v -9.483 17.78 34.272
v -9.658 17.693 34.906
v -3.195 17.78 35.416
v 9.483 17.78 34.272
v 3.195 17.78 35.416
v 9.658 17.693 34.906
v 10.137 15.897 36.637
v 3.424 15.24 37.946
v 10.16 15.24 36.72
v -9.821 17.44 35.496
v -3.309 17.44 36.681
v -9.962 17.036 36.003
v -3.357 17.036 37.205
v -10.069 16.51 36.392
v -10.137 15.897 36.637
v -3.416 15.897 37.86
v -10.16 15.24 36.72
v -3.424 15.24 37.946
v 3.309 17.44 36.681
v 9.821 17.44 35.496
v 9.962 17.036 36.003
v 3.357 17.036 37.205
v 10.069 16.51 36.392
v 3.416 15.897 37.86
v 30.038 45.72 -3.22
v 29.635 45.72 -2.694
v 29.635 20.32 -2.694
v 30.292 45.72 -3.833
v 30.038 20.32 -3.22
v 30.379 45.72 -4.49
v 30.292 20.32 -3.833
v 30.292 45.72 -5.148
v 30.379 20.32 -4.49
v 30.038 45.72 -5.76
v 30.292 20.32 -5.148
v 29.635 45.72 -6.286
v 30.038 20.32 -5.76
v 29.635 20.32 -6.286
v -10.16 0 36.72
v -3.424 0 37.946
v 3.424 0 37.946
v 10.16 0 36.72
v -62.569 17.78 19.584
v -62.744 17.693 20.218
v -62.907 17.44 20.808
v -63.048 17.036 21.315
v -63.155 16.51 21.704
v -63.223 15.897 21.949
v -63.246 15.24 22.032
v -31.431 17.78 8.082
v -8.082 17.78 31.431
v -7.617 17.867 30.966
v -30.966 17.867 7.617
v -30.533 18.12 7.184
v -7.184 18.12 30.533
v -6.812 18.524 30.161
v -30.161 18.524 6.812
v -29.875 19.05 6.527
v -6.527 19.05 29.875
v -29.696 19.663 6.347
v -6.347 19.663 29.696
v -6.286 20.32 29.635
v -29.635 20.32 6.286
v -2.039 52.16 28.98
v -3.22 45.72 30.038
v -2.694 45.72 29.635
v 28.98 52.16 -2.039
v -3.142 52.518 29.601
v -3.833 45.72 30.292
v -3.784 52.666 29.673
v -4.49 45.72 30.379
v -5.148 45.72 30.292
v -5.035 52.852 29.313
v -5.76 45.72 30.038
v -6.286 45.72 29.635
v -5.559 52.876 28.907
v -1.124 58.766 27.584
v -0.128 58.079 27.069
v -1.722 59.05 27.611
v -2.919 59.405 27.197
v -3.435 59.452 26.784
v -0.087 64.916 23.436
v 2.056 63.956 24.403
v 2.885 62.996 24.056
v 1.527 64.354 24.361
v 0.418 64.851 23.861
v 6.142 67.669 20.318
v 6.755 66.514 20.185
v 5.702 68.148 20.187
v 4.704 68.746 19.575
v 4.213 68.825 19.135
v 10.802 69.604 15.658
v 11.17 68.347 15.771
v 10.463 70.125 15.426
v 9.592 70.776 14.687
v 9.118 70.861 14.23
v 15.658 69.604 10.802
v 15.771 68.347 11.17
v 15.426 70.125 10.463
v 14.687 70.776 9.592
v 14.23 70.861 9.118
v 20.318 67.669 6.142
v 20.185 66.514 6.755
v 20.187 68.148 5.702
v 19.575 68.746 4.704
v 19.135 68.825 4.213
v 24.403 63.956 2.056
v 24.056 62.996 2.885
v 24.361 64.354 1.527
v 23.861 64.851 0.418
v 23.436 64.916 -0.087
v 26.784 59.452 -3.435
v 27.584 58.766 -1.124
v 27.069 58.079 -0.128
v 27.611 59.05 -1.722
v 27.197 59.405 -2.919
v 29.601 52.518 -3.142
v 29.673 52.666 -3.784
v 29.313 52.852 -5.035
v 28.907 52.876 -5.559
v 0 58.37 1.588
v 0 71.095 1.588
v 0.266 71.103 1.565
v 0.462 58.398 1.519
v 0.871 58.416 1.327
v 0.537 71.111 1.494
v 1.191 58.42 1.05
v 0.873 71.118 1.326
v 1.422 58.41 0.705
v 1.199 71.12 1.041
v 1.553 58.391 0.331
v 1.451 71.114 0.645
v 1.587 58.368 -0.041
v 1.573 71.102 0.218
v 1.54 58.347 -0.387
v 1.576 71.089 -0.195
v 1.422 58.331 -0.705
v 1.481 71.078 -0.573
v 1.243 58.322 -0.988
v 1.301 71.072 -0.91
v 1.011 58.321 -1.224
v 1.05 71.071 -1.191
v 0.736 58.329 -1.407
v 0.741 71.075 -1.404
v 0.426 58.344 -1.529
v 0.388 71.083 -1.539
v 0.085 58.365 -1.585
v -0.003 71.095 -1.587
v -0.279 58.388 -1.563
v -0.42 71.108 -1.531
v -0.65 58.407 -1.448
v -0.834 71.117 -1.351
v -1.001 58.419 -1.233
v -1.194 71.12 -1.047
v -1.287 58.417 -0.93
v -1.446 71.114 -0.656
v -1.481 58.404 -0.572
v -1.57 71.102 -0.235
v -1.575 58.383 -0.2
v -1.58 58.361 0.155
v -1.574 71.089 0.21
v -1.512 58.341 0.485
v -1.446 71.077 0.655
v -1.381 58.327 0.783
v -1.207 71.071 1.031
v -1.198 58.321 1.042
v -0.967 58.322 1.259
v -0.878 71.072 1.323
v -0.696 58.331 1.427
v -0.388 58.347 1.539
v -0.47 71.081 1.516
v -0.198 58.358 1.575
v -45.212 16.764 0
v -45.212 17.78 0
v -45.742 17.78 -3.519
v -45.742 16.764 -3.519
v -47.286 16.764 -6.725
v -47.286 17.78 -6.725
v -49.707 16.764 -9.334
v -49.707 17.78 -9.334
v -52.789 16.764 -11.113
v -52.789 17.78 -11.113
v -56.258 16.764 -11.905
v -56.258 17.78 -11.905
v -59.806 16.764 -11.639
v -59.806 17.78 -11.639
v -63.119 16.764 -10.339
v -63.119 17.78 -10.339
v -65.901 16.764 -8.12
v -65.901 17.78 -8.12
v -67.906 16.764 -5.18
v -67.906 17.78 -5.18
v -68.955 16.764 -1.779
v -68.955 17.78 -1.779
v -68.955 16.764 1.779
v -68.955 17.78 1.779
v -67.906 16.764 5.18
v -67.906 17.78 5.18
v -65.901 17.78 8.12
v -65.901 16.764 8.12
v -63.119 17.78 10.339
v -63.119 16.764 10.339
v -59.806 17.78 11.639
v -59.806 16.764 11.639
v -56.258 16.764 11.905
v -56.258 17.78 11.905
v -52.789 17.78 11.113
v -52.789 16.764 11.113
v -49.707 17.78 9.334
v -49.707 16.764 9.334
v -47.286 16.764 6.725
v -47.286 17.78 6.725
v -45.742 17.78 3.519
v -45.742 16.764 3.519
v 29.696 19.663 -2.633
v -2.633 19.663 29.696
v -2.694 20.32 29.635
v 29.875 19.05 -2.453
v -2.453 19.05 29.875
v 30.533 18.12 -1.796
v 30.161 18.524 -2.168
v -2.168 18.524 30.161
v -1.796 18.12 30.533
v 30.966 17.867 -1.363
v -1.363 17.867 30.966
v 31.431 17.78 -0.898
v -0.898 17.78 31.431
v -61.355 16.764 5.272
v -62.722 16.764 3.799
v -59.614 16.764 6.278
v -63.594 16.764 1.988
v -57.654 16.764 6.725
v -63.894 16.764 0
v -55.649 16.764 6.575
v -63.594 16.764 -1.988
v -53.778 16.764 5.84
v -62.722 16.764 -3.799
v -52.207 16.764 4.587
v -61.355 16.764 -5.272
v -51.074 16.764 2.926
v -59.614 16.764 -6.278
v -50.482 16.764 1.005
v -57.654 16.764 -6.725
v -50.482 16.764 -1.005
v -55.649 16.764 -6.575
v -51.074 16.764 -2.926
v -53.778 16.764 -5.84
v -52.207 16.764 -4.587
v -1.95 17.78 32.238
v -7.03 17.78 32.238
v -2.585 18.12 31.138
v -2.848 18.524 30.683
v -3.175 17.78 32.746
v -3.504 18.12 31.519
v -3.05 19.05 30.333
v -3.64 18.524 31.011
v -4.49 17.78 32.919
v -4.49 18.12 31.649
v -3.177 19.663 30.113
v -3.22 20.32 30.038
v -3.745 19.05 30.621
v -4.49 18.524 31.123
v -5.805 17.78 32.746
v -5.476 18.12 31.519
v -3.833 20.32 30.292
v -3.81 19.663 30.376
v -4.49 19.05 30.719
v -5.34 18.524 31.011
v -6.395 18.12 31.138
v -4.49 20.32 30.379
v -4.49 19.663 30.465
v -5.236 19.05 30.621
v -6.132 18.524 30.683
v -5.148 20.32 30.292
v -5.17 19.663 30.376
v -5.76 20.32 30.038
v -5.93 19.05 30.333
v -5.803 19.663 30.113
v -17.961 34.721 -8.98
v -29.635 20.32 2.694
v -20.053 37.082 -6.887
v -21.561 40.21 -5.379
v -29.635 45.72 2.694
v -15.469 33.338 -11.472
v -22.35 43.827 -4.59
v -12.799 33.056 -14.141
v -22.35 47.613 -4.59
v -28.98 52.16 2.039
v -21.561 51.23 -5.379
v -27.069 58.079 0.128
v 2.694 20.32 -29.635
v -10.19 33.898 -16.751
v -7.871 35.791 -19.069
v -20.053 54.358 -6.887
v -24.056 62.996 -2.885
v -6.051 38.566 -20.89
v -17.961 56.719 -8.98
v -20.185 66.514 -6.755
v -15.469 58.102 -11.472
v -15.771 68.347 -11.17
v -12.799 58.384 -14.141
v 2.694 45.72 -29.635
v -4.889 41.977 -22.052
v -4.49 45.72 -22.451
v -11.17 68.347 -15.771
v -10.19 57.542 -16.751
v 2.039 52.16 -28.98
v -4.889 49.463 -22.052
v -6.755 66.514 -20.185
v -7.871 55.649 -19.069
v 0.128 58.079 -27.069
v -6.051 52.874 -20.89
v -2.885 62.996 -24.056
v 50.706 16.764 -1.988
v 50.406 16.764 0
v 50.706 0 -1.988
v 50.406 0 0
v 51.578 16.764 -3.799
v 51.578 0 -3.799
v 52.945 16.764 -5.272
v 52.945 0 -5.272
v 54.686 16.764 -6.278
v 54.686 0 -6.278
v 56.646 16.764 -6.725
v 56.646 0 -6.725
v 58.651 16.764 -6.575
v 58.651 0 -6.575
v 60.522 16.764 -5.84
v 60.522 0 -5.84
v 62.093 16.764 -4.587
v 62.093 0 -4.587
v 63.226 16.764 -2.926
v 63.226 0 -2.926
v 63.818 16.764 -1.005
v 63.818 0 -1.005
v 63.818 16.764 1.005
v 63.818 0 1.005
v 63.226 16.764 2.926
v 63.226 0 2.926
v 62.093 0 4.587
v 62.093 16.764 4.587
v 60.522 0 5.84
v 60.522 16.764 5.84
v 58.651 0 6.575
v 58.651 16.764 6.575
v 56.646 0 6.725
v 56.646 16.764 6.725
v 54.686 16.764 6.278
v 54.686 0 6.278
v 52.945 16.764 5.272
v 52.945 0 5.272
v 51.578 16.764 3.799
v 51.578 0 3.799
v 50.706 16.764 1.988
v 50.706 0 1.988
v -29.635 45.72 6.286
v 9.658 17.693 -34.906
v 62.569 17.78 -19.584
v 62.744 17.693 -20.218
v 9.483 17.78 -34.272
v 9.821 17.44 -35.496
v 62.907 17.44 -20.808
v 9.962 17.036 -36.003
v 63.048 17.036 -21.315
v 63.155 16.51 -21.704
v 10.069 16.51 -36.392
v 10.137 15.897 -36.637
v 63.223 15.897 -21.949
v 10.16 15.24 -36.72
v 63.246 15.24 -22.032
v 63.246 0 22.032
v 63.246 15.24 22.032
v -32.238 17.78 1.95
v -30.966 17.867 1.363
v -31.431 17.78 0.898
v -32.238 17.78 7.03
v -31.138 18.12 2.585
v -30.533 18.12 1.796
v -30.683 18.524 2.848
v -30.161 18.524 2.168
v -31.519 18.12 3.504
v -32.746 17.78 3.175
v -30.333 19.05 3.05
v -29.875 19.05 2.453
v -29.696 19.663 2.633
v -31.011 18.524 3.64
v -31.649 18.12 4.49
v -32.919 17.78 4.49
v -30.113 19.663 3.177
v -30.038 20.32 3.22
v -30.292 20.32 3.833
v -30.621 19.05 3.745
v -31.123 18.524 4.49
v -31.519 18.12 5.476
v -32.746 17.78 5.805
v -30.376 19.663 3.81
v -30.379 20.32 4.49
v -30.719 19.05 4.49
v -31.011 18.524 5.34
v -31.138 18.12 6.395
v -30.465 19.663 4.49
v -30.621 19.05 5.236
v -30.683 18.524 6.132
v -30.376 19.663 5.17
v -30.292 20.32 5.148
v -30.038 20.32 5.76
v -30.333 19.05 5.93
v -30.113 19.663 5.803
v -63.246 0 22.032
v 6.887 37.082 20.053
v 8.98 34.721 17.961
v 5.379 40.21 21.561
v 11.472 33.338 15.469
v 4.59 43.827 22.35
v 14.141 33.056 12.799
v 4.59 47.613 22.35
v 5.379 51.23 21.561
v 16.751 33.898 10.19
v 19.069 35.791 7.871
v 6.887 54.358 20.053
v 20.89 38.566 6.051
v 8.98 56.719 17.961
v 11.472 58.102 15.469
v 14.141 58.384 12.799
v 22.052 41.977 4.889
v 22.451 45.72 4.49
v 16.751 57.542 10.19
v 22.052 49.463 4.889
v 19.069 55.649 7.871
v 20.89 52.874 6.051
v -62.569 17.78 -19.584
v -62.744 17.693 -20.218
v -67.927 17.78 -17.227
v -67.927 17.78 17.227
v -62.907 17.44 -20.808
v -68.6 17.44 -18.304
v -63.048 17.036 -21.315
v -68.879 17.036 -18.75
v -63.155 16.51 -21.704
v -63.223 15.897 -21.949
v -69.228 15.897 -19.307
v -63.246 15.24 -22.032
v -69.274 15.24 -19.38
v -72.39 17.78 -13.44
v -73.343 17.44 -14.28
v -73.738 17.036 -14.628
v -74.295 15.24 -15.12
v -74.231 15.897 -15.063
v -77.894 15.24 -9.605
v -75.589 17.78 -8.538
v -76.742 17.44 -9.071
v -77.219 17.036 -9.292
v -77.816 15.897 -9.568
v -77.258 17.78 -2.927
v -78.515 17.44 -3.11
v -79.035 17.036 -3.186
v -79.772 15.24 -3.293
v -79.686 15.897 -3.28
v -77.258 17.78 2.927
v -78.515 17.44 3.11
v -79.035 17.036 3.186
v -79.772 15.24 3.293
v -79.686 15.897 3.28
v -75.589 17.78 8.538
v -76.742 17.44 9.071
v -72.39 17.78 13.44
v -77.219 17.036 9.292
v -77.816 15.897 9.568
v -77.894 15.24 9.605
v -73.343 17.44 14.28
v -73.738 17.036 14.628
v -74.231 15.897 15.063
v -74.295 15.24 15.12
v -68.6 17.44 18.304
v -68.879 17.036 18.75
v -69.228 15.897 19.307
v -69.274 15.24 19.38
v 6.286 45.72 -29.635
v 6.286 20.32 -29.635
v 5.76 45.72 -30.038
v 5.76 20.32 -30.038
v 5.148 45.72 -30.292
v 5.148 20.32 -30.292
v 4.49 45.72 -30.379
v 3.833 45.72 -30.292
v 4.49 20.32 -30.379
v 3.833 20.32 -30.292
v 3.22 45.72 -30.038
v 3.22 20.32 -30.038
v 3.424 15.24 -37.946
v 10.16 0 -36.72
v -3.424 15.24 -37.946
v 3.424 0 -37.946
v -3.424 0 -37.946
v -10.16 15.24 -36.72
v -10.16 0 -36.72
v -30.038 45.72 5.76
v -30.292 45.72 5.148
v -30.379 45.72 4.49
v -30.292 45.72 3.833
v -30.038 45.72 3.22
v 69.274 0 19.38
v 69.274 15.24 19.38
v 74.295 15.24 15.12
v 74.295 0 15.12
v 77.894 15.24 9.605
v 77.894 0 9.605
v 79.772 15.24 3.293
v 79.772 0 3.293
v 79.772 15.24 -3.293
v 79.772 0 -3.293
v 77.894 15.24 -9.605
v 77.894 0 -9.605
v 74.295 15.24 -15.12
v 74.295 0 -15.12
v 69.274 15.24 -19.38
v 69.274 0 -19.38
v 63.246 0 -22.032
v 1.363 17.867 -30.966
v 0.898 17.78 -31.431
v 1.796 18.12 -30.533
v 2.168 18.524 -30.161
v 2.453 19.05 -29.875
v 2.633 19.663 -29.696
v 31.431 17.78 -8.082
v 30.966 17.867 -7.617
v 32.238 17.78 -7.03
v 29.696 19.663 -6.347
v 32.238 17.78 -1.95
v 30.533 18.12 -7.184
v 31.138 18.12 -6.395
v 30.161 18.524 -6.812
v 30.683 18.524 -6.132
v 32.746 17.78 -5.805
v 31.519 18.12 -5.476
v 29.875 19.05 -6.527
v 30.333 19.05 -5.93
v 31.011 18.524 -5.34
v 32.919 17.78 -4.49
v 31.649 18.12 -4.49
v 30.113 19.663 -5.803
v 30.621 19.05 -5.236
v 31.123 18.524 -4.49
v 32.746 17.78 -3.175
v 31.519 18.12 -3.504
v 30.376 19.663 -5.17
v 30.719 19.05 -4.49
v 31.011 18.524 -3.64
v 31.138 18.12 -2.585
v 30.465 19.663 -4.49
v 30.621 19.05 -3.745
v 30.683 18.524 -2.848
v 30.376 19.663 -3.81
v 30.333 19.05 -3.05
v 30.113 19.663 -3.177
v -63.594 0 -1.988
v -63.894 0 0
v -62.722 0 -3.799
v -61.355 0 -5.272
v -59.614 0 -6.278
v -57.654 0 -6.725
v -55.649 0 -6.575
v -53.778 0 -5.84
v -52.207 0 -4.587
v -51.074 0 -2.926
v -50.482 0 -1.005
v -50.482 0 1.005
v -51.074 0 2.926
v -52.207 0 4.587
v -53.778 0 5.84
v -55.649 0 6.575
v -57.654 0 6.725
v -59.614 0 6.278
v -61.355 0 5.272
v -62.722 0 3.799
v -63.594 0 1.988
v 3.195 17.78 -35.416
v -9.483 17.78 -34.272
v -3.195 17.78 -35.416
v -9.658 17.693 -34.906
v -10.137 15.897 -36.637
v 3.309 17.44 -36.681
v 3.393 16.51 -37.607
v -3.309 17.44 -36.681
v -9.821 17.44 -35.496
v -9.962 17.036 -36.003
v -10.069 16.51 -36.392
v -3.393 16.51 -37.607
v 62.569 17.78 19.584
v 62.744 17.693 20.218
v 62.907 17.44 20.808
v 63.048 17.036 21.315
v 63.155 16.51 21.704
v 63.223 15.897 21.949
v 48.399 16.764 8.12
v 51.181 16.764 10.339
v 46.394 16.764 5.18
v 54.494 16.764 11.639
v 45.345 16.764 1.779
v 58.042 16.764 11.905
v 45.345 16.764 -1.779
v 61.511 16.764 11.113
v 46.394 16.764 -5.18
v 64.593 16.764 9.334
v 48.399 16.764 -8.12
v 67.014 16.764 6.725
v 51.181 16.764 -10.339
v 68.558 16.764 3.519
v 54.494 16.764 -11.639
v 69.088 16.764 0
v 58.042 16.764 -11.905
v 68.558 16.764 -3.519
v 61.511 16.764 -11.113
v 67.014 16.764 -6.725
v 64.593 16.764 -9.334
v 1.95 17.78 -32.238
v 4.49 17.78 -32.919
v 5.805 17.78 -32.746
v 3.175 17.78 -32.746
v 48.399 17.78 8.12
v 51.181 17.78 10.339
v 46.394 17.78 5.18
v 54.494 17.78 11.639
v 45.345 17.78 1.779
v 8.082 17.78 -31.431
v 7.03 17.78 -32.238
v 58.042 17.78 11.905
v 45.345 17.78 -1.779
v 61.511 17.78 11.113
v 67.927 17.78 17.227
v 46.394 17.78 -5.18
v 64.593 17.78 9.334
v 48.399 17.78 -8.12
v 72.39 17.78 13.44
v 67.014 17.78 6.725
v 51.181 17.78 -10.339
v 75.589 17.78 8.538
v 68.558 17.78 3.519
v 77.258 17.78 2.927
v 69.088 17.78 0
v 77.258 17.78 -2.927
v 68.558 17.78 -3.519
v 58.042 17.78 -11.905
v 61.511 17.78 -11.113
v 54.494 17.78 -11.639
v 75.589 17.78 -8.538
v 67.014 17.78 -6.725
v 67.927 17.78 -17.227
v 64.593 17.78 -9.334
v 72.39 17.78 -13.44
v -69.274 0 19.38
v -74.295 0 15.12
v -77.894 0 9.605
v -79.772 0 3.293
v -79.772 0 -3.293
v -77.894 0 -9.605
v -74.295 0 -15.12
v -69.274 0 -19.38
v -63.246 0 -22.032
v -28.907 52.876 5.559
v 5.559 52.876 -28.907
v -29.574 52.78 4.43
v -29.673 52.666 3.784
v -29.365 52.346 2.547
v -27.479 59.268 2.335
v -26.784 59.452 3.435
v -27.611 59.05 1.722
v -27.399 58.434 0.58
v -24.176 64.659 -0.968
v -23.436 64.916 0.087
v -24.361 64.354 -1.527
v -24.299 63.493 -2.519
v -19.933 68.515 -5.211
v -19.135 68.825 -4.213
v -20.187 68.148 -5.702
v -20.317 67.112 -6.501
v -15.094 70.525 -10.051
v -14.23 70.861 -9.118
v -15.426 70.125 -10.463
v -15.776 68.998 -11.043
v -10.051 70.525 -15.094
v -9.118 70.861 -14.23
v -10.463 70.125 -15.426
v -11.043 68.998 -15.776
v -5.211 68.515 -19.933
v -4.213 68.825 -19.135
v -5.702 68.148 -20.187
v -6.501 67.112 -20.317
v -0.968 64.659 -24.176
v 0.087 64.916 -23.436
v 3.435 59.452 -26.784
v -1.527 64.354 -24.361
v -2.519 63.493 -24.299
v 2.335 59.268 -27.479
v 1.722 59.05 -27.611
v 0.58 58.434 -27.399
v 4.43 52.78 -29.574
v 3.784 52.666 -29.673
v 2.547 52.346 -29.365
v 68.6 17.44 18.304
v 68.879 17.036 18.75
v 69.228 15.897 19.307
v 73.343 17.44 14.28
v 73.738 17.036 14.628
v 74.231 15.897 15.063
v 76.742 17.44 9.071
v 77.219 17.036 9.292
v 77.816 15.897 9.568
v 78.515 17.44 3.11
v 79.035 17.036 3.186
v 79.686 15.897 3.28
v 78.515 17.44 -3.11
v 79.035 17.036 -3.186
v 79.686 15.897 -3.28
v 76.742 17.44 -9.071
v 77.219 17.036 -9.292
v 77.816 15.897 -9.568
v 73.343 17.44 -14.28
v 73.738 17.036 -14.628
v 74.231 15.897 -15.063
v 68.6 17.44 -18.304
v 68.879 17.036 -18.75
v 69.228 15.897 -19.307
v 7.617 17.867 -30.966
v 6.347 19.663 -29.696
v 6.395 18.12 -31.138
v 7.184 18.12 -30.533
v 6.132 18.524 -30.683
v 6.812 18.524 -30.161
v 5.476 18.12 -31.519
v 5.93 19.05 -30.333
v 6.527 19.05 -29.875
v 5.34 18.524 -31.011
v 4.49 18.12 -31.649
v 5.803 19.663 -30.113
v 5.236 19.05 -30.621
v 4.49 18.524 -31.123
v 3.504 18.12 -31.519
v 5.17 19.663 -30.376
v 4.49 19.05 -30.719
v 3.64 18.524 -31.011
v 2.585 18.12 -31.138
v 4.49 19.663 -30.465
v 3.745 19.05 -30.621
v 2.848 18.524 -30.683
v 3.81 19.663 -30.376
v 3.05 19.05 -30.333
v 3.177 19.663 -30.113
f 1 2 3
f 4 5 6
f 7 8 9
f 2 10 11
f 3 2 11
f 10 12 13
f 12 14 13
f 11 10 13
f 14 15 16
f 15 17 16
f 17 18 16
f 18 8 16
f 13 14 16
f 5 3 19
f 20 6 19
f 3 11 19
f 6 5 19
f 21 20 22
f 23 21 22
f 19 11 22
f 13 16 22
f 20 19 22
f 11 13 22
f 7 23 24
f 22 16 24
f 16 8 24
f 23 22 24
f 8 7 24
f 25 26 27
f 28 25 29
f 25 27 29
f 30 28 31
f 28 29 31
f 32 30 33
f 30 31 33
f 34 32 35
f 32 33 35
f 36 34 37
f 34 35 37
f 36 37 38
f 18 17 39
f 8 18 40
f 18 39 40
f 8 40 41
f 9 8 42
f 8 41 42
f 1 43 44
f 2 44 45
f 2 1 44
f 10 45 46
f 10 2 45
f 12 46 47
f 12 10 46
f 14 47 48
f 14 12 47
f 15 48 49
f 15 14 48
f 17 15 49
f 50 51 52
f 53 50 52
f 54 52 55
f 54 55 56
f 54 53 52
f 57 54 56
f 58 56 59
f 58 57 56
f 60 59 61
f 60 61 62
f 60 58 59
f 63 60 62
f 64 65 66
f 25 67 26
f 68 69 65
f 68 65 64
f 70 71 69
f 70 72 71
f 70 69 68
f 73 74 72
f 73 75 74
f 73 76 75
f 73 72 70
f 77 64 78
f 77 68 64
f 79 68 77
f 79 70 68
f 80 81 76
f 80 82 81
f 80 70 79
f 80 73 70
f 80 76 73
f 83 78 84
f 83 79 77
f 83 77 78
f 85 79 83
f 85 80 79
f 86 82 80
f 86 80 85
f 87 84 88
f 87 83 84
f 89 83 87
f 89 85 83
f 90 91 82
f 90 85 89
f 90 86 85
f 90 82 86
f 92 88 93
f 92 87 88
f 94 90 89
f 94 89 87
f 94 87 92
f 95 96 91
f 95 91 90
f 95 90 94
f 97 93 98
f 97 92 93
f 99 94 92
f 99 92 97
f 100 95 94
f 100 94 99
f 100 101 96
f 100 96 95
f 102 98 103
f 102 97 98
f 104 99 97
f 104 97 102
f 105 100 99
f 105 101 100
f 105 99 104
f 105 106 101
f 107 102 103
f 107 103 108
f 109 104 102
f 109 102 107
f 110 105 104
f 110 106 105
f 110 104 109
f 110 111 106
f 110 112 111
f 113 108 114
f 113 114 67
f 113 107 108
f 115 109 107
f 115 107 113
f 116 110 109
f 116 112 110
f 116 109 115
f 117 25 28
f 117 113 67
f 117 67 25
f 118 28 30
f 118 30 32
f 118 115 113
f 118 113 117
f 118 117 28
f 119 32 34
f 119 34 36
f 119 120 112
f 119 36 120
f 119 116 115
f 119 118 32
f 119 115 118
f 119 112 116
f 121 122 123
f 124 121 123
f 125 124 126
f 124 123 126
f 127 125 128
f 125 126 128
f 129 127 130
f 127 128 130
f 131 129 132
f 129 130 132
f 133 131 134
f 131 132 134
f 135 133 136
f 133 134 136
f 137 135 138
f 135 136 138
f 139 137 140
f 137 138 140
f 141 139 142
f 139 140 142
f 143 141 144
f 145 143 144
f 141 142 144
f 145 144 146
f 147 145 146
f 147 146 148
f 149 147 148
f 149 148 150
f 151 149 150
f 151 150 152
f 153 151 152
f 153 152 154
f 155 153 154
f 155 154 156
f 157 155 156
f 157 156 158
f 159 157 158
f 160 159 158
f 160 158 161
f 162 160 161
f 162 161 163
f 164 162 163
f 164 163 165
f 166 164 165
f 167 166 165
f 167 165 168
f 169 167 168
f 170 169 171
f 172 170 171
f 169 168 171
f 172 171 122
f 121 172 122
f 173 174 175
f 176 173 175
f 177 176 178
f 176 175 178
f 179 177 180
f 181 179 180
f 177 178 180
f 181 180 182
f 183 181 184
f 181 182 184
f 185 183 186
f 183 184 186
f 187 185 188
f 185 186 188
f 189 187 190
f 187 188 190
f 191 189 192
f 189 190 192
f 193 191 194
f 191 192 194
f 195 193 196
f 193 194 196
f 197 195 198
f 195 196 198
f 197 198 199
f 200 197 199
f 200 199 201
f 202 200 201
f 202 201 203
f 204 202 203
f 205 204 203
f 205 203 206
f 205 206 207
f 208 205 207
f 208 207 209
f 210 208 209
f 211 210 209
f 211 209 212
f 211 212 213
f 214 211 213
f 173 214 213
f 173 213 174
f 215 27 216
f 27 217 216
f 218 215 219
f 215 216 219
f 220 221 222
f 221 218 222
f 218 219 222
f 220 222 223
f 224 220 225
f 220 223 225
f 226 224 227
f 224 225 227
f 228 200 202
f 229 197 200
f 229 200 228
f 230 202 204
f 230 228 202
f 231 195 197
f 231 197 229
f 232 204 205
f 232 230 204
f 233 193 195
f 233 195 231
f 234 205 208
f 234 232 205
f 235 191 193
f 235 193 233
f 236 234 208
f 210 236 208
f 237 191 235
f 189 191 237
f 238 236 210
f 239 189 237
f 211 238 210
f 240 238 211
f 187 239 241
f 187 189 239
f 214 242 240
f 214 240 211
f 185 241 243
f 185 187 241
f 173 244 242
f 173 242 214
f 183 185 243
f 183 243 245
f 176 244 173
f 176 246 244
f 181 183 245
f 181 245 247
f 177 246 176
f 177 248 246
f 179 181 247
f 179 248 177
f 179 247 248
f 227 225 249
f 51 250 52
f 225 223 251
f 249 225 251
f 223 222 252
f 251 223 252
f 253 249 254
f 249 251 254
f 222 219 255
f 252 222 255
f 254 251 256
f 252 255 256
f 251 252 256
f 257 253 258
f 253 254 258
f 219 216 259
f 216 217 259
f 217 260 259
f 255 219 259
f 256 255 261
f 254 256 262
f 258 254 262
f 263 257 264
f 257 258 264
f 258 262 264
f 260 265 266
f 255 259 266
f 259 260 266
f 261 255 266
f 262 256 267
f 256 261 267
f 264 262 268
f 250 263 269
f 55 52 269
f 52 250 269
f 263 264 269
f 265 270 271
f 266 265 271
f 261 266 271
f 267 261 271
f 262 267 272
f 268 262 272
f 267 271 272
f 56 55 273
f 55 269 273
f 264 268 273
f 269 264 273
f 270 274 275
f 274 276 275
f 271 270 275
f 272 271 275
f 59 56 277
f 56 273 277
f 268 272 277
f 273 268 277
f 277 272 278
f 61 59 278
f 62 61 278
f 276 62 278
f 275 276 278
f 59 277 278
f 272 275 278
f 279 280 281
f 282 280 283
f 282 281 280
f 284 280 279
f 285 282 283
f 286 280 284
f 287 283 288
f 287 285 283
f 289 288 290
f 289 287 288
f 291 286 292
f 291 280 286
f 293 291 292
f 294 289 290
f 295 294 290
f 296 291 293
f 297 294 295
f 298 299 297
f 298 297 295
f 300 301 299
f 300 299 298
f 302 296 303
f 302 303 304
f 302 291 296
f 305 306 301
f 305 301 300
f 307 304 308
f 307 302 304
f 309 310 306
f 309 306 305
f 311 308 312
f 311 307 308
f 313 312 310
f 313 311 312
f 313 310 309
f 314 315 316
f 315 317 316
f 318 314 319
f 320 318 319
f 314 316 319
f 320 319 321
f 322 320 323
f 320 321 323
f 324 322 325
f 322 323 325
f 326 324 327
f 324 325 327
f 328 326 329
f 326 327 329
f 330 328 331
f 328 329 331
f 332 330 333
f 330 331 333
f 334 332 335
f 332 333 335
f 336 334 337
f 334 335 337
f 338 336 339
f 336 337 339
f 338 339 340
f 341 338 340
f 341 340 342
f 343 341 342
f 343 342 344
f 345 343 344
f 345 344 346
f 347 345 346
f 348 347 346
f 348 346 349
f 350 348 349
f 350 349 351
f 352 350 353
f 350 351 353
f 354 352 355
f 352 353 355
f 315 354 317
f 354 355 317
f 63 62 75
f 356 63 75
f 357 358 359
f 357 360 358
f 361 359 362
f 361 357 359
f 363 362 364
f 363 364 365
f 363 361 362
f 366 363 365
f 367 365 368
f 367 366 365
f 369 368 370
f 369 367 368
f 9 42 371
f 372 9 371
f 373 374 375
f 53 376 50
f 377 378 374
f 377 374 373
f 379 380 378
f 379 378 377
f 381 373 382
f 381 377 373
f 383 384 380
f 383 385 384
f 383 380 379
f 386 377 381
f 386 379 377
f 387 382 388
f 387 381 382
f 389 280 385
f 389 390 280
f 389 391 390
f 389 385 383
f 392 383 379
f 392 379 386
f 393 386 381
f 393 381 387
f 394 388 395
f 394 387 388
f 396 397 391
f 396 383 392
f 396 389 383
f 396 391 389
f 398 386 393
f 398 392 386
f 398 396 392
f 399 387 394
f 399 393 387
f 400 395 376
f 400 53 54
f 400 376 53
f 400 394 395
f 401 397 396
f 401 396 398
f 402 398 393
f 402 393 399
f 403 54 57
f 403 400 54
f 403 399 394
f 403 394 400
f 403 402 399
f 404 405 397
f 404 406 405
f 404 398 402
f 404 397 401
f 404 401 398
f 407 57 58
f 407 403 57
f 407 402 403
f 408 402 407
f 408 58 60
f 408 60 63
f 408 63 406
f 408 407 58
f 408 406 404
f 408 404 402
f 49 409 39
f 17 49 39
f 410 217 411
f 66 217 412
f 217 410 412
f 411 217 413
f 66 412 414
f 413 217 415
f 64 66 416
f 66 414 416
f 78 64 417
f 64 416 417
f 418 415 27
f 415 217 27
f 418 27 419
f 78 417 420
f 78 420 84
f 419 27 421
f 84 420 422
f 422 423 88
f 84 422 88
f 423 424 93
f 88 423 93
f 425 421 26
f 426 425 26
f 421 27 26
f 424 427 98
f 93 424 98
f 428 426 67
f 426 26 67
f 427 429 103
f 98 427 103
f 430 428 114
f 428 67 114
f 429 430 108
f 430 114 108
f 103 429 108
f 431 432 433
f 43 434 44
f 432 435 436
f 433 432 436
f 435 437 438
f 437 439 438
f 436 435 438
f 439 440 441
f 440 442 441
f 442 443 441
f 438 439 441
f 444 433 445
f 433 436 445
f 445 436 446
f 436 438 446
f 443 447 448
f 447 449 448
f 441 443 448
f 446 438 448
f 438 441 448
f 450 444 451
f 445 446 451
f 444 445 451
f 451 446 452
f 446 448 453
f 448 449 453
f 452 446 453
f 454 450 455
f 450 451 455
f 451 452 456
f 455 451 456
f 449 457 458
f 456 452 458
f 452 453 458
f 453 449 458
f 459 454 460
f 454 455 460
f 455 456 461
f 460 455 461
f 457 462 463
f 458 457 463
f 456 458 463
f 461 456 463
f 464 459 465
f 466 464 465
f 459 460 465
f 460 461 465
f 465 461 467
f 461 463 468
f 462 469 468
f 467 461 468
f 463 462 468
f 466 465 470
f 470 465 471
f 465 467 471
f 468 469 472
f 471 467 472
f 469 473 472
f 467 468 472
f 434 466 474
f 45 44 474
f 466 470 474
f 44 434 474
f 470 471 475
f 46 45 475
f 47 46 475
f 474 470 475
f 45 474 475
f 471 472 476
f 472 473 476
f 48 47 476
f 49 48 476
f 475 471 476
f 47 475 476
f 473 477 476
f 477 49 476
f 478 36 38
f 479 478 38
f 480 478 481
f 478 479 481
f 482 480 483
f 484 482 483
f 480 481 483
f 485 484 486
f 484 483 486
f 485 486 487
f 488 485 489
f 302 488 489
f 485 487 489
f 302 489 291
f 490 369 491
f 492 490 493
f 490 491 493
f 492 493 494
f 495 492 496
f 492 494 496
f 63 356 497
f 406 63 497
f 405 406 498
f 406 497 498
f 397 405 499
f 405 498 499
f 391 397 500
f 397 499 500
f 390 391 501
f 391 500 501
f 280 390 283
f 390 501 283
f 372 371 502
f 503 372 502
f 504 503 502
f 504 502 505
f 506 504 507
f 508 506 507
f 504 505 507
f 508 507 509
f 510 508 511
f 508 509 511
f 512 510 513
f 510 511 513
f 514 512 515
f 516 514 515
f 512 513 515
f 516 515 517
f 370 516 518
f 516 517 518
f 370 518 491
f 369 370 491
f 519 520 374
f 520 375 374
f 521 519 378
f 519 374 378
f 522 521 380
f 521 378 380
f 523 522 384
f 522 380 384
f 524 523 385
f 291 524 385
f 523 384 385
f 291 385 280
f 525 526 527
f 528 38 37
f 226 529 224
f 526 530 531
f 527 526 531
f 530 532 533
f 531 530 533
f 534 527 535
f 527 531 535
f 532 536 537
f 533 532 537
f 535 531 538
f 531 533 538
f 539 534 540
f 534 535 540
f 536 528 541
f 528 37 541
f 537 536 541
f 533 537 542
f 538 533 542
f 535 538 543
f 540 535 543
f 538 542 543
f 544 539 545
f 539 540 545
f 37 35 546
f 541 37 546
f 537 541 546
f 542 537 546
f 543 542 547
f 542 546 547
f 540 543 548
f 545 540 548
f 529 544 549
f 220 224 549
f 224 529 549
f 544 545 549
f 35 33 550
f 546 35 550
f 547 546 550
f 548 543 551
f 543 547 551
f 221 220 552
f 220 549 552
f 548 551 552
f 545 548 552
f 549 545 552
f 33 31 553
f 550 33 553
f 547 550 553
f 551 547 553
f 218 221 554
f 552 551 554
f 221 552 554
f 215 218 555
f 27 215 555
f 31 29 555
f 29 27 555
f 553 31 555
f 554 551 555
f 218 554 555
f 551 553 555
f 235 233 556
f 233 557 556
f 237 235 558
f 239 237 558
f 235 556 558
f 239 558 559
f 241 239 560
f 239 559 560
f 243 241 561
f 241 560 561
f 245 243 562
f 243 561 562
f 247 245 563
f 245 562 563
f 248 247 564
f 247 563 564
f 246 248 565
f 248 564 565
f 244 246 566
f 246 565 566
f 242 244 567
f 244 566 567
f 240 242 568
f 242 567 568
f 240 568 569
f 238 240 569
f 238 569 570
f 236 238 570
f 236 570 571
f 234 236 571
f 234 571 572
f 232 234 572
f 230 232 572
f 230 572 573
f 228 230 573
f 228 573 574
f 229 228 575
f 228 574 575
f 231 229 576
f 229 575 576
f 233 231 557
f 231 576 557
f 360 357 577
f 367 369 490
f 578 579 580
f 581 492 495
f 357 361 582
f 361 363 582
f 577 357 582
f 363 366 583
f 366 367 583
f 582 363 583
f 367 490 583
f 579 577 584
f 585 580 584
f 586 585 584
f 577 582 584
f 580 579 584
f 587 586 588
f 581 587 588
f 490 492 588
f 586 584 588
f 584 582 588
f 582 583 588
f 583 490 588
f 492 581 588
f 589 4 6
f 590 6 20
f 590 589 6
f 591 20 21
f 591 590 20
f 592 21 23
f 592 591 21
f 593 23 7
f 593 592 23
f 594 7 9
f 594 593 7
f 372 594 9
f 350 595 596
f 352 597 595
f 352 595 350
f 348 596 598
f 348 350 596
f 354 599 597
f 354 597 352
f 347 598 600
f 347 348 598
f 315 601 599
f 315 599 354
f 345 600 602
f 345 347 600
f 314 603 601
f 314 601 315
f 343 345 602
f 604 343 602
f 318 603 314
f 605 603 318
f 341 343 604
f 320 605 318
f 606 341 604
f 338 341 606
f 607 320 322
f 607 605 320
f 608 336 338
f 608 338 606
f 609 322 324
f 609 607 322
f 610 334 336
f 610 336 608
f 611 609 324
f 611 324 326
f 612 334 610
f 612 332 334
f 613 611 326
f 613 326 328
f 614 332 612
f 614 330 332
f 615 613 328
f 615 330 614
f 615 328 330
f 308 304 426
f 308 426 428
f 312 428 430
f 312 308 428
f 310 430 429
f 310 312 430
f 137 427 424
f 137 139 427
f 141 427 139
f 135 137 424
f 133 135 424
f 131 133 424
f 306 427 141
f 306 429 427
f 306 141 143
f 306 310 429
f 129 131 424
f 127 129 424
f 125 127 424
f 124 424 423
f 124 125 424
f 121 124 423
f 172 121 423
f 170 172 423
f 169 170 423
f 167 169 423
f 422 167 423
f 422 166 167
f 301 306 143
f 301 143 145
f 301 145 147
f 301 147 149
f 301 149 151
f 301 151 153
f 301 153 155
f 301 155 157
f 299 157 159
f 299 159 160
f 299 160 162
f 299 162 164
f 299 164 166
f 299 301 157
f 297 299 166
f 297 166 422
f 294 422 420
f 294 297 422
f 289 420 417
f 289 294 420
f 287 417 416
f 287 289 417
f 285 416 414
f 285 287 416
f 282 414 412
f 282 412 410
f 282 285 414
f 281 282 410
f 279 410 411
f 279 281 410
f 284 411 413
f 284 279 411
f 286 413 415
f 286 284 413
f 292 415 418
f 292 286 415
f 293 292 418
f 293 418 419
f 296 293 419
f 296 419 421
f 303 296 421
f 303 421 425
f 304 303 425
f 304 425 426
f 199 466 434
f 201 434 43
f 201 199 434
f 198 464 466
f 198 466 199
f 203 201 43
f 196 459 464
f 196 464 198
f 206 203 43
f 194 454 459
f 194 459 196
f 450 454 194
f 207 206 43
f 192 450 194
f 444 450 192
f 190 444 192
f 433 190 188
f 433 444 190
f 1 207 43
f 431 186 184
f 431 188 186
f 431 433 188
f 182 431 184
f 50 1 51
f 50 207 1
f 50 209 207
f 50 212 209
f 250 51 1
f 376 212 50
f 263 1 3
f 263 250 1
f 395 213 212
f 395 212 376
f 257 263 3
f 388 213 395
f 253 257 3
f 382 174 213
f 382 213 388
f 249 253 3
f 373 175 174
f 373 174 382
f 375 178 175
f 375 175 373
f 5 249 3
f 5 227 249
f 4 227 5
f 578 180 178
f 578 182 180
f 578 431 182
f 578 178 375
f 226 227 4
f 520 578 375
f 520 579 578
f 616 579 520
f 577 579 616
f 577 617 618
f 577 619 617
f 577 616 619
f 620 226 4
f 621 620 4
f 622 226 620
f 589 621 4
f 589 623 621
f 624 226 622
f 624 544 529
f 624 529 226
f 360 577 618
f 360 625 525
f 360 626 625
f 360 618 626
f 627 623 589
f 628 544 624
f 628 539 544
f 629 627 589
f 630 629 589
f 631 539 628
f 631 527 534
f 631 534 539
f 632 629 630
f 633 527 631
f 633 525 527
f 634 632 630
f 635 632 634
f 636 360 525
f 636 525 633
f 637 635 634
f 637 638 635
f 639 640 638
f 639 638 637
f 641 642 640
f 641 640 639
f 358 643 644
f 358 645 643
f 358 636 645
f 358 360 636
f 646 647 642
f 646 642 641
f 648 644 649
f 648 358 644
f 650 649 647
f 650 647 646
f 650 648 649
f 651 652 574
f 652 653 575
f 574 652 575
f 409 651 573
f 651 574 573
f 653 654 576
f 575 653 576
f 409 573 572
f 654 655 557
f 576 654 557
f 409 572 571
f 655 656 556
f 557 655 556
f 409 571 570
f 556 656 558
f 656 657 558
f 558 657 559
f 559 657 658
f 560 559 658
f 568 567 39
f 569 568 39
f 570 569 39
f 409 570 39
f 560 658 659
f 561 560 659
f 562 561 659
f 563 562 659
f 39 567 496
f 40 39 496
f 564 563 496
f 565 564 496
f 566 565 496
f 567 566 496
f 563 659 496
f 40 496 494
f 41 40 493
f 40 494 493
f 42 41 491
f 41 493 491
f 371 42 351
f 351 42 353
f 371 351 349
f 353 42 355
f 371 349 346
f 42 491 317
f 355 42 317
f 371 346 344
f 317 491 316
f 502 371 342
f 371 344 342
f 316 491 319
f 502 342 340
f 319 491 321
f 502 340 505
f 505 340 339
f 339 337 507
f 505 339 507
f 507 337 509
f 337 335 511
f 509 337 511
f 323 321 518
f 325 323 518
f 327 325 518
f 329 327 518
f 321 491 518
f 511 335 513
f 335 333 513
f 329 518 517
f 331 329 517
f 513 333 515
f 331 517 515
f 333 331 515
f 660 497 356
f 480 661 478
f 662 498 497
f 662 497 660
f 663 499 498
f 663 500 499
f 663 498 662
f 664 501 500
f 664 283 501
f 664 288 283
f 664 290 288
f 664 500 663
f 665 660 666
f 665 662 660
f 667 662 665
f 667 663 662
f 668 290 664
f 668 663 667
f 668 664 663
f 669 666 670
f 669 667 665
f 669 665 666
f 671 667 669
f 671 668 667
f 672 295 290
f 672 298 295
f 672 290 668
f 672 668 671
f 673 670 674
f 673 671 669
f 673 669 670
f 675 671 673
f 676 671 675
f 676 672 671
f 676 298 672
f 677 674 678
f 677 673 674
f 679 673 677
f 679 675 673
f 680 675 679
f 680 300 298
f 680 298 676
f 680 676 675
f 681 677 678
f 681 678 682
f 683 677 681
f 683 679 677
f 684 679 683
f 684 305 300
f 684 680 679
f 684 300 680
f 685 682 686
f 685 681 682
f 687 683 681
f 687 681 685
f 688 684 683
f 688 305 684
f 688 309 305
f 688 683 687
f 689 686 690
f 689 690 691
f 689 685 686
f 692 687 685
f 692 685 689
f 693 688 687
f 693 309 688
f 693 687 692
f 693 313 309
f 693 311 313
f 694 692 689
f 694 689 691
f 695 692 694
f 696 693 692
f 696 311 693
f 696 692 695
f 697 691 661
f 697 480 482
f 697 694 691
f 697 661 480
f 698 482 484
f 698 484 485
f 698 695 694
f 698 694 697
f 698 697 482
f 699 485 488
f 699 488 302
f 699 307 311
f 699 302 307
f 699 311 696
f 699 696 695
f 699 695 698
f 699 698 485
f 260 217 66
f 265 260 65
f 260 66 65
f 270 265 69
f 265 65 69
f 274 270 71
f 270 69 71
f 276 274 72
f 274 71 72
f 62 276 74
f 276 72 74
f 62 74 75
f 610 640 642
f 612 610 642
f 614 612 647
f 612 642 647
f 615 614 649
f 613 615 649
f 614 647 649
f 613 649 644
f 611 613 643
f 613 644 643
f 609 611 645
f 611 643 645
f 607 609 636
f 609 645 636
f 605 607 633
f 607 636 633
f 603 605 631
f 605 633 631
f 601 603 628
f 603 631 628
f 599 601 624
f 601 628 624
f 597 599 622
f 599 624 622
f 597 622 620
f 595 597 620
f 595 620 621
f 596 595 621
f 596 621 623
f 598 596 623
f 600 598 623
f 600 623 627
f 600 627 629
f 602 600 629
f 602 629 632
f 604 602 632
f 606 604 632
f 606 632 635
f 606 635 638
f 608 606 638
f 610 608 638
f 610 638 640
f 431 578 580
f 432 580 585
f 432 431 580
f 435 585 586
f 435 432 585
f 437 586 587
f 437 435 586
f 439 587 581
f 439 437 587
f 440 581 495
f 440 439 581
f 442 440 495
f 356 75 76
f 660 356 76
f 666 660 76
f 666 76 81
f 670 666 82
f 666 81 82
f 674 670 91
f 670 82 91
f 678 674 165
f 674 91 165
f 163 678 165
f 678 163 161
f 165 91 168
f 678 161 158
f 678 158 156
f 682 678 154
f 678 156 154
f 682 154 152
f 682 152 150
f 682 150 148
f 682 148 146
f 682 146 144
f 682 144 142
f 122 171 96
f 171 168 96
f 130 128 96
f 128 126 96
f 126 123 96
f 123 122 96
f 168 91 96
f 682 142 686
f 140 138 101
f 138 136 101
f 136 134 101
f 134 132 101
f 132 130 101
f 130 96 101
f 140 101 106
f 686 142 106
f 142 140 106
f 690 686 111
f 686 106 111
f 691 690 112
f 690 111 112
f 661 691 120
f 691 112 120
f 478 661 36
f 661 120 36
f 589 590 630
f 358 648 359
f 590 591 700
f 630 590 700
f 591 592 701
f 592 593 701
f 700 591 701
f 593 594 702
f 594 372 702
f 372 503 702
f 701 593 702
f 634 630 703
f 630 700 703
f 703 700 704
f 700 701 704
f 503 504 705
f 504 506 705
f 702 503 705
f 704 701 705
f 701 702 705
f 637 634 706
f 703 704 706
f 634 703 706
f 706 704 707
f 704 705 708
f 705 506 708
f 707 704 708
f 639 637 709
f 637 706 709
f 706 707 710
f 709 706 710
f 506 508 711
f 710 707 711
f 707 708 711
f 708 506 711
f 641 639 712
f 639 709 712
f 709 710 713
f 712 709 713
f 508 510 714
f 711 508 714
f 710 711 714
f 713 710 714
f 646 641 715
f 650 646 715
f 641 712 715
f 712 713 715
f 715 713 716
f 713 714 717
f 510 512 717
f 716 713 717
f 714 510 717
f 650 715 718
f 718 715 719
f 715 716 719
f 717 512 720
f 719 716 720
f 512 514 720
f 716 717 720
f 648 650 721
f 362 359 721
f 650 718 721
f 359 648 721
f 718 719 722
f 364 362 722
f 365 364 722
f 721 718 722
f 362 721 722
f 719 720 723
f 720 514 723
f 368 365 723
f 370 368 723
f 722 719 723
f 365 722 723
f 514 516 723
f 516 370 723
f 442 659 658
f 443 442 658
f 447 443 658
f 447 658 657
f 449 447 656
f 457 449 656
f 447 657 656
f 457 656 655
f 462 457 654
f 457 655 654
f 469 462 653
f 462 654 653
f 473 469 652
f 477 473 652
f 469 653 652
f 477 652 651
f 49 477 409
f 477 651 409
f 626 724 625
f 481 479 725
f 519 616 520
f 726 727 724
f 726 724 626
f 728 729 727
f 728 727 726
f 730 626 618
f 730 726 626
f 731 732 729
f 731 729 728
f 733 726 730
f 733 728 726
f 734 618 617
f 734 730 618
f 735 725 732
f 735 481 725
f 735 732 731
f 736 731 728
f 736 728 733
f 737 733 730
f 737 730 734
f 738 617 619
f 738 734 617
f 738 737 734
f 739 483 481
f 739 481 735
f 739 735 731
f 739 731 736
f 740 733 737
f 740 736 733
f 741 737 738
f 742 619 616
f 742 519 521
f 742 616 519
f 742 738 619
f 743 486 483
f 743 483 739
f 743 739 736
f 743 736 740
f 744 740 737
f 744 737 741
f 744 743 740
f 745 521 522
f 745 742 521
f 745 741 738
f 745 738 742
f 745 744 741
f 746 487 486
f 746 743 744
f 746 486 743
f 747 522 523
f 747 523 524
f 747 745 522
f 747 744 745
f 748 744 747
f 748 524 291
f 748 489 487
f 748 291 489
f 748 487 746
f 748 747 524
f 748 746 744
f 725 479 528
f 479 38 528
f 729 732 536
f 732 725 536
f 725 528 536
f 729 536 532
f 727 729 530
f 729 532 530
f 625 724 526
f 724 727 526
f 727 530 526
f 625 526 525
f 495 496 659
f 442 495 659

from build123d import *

# Parameters (mm, degrees)
BOSS_EXTRUDE1_DEPTH                                 = 17.78
CBORE_FOR_00_BINDING_HEAD_MACHINE_SCREW_D           = 13.4874
CBORE_FOR_00_BINDING_HEAD_MACHINE_SCREW_CBORE_D     = 23.876
CBORE_FOR_00_BINDING_HEAD_MACHINE_SCREW_CBORE_DEPTH = 1.016
SKETCH4_R                                           = 12.7
BOSS_EXTRUDE2_DEPTH                                 = 19.05
F_1_8_0_125_DIAMETER_HOLE1_REACH                    = 115.628
F_1_8_0_125_DIAMETER_HOLE1_BORE_R                   = 1.5875
FILLET1_R                                           = 2.54


with BuildPart() as part:
    # Sketch1 → Boss-Extrude1 (new body)
    with BuildSketch(Plane(origin=(0, 0, 0), x_dir=(1, 0, 0), z_dir=(0, 1, 0))):
        with BuildLine():
            Line((63.246, 22.032212417), (10.16, 36.720354029))
            ThreePointArc((10.16, 36.720354029), (0, 38.1), (-10.16, 36.720354029))
            Line((-10.16, 36.720354029), (-63.246, 22.032212417))
            ThreePointArc((-63.246, 22.032212417), (-80.01, 0), (-63.246, -22.032212417))
            Line((-63.246, -22.032212417), (-10.16, -36.720354029))
            ThreePointArc((-10.16, -36.720354029), (0, -38.1), (10.16, -36.720354029))
            Line((10.16, -36.720354029), (63.246, -22.032212417))
            ThreePointArc((63.246, -22.032212417), (80.01, 0), (63.246, 22.032212417))
        make_face()
    extrude(amount=BOSS_EXTRUDE1_DEPTH)

    # CBORE for #00 Binding Head Machine Screw1 (through all)
    with Locations(Plane(origin=(0, 17.78, 0), x_dir=(1, 0, 0), z_dir=(0, 1, 0))):
        with Locations((-57.15, 0), (57.15, 0)):
            CounterBoreHole(CBORE_FOR_00_BINDING_HEAD_MACHINE_SCREW_D / 2, CBORE_FOR_00_BINDING_HEAD_MACHINE_SCREW_CBORE_D / 2, CBORE_FOR_00_BINDING_HEAD_MACHINE_SCREW_CBORE_DEPTH)

    # Sketch4 → Boss-Extrude2 (add, symmetric)
    with BuildSketch(Plane(origin=(0, 0, 0), x_dir=(0, -1, 0), z_dir=(0.7071067811865464, 0, 0.7071067811865488))):
        with BuildLine():
            Line((-45.72, 25.4), (-15.24, 25.4))
            Line((-15.24, 25.4), (-15.24, -25.4))
            Line((-15.24, -25.4), (-45.72, -25.4))
            ThreePointArc((-45.72, -25.4), (-71.12, 0), (-45.72, 25.4))
        make_face()
        with Locations(Location((-45.72, 0, 0), (0, 0, 90))):
            Circle(SKETCH4_R, mode=Mode.SUBTRACT)
    extrude(amount=BOSS_EXTRUDE2_DEPTH, both=True)

    # 1/8 (0.125) Diameter Hole1 bore (on position points) → 1/8 (0.125) Diameter Hole1 (cut, up to next)
    with BuildSketch(Plane.ZX.offset(71.12), mode=Mode.PRIVATE) as f_1_8_0_125_diameter_hole1_sk1:
        Circle(F_1_8_0_125_DIAMETER_HOLE1_BORE_R)
    f_1_8_0_125_diameter_hole1_tool1 = extrude(f_1_8_0_125_diameter_hole1_sk1.sketch, amount=-F_1_8_0_125_DIAMETER_HOLE1_REACH, mode=Mode.PRIVATE) & part.part
    add(f_1_8_0_125_diameter_hole1_tool1.solids().sort_by_distance((0, 71.12, 0))[0], mode=Mode.SUBTRACT)

    # Fillet1
    fillet1_edges = [part.edges().sort_by_distance(p)[0] for p in [
        (0, 17.78, -38.1),
        (-36.703, 17.78, -29.376283223),
        (-80.01, 17.78, 0),
        (-36.703, 17.78, 29.376283223),
        (0, 17.78, 38.1),
        (36.703, 17.78, 29.376283223),
        (80.01, 17.78, 0),
        (17.960512242, 17.78, -17.960512242),
        (-13.470384182, 17.78, -13.470384182),
        (13.470384182, 17.78, 13.470384182),
        (-17.960512242, 17.78, 17.960512242),
        (-4.490128061, 31.75, 31.430896424),
        (31.430896424, 31.75, -4.490128061),
        (13.470384182, 71.12, 13.470384182),
        (-13.470384182, 71.12, -13.470384182),
        (-31.430896424, 31.75, 4.490128061),
        (4.490128061, 31.75, -31.430896424),
        (36.703, 17.78, -29.376283223),
    ]]
    fillet(fillet1_edges, radius=FILLET1_R)


solid = part.part
